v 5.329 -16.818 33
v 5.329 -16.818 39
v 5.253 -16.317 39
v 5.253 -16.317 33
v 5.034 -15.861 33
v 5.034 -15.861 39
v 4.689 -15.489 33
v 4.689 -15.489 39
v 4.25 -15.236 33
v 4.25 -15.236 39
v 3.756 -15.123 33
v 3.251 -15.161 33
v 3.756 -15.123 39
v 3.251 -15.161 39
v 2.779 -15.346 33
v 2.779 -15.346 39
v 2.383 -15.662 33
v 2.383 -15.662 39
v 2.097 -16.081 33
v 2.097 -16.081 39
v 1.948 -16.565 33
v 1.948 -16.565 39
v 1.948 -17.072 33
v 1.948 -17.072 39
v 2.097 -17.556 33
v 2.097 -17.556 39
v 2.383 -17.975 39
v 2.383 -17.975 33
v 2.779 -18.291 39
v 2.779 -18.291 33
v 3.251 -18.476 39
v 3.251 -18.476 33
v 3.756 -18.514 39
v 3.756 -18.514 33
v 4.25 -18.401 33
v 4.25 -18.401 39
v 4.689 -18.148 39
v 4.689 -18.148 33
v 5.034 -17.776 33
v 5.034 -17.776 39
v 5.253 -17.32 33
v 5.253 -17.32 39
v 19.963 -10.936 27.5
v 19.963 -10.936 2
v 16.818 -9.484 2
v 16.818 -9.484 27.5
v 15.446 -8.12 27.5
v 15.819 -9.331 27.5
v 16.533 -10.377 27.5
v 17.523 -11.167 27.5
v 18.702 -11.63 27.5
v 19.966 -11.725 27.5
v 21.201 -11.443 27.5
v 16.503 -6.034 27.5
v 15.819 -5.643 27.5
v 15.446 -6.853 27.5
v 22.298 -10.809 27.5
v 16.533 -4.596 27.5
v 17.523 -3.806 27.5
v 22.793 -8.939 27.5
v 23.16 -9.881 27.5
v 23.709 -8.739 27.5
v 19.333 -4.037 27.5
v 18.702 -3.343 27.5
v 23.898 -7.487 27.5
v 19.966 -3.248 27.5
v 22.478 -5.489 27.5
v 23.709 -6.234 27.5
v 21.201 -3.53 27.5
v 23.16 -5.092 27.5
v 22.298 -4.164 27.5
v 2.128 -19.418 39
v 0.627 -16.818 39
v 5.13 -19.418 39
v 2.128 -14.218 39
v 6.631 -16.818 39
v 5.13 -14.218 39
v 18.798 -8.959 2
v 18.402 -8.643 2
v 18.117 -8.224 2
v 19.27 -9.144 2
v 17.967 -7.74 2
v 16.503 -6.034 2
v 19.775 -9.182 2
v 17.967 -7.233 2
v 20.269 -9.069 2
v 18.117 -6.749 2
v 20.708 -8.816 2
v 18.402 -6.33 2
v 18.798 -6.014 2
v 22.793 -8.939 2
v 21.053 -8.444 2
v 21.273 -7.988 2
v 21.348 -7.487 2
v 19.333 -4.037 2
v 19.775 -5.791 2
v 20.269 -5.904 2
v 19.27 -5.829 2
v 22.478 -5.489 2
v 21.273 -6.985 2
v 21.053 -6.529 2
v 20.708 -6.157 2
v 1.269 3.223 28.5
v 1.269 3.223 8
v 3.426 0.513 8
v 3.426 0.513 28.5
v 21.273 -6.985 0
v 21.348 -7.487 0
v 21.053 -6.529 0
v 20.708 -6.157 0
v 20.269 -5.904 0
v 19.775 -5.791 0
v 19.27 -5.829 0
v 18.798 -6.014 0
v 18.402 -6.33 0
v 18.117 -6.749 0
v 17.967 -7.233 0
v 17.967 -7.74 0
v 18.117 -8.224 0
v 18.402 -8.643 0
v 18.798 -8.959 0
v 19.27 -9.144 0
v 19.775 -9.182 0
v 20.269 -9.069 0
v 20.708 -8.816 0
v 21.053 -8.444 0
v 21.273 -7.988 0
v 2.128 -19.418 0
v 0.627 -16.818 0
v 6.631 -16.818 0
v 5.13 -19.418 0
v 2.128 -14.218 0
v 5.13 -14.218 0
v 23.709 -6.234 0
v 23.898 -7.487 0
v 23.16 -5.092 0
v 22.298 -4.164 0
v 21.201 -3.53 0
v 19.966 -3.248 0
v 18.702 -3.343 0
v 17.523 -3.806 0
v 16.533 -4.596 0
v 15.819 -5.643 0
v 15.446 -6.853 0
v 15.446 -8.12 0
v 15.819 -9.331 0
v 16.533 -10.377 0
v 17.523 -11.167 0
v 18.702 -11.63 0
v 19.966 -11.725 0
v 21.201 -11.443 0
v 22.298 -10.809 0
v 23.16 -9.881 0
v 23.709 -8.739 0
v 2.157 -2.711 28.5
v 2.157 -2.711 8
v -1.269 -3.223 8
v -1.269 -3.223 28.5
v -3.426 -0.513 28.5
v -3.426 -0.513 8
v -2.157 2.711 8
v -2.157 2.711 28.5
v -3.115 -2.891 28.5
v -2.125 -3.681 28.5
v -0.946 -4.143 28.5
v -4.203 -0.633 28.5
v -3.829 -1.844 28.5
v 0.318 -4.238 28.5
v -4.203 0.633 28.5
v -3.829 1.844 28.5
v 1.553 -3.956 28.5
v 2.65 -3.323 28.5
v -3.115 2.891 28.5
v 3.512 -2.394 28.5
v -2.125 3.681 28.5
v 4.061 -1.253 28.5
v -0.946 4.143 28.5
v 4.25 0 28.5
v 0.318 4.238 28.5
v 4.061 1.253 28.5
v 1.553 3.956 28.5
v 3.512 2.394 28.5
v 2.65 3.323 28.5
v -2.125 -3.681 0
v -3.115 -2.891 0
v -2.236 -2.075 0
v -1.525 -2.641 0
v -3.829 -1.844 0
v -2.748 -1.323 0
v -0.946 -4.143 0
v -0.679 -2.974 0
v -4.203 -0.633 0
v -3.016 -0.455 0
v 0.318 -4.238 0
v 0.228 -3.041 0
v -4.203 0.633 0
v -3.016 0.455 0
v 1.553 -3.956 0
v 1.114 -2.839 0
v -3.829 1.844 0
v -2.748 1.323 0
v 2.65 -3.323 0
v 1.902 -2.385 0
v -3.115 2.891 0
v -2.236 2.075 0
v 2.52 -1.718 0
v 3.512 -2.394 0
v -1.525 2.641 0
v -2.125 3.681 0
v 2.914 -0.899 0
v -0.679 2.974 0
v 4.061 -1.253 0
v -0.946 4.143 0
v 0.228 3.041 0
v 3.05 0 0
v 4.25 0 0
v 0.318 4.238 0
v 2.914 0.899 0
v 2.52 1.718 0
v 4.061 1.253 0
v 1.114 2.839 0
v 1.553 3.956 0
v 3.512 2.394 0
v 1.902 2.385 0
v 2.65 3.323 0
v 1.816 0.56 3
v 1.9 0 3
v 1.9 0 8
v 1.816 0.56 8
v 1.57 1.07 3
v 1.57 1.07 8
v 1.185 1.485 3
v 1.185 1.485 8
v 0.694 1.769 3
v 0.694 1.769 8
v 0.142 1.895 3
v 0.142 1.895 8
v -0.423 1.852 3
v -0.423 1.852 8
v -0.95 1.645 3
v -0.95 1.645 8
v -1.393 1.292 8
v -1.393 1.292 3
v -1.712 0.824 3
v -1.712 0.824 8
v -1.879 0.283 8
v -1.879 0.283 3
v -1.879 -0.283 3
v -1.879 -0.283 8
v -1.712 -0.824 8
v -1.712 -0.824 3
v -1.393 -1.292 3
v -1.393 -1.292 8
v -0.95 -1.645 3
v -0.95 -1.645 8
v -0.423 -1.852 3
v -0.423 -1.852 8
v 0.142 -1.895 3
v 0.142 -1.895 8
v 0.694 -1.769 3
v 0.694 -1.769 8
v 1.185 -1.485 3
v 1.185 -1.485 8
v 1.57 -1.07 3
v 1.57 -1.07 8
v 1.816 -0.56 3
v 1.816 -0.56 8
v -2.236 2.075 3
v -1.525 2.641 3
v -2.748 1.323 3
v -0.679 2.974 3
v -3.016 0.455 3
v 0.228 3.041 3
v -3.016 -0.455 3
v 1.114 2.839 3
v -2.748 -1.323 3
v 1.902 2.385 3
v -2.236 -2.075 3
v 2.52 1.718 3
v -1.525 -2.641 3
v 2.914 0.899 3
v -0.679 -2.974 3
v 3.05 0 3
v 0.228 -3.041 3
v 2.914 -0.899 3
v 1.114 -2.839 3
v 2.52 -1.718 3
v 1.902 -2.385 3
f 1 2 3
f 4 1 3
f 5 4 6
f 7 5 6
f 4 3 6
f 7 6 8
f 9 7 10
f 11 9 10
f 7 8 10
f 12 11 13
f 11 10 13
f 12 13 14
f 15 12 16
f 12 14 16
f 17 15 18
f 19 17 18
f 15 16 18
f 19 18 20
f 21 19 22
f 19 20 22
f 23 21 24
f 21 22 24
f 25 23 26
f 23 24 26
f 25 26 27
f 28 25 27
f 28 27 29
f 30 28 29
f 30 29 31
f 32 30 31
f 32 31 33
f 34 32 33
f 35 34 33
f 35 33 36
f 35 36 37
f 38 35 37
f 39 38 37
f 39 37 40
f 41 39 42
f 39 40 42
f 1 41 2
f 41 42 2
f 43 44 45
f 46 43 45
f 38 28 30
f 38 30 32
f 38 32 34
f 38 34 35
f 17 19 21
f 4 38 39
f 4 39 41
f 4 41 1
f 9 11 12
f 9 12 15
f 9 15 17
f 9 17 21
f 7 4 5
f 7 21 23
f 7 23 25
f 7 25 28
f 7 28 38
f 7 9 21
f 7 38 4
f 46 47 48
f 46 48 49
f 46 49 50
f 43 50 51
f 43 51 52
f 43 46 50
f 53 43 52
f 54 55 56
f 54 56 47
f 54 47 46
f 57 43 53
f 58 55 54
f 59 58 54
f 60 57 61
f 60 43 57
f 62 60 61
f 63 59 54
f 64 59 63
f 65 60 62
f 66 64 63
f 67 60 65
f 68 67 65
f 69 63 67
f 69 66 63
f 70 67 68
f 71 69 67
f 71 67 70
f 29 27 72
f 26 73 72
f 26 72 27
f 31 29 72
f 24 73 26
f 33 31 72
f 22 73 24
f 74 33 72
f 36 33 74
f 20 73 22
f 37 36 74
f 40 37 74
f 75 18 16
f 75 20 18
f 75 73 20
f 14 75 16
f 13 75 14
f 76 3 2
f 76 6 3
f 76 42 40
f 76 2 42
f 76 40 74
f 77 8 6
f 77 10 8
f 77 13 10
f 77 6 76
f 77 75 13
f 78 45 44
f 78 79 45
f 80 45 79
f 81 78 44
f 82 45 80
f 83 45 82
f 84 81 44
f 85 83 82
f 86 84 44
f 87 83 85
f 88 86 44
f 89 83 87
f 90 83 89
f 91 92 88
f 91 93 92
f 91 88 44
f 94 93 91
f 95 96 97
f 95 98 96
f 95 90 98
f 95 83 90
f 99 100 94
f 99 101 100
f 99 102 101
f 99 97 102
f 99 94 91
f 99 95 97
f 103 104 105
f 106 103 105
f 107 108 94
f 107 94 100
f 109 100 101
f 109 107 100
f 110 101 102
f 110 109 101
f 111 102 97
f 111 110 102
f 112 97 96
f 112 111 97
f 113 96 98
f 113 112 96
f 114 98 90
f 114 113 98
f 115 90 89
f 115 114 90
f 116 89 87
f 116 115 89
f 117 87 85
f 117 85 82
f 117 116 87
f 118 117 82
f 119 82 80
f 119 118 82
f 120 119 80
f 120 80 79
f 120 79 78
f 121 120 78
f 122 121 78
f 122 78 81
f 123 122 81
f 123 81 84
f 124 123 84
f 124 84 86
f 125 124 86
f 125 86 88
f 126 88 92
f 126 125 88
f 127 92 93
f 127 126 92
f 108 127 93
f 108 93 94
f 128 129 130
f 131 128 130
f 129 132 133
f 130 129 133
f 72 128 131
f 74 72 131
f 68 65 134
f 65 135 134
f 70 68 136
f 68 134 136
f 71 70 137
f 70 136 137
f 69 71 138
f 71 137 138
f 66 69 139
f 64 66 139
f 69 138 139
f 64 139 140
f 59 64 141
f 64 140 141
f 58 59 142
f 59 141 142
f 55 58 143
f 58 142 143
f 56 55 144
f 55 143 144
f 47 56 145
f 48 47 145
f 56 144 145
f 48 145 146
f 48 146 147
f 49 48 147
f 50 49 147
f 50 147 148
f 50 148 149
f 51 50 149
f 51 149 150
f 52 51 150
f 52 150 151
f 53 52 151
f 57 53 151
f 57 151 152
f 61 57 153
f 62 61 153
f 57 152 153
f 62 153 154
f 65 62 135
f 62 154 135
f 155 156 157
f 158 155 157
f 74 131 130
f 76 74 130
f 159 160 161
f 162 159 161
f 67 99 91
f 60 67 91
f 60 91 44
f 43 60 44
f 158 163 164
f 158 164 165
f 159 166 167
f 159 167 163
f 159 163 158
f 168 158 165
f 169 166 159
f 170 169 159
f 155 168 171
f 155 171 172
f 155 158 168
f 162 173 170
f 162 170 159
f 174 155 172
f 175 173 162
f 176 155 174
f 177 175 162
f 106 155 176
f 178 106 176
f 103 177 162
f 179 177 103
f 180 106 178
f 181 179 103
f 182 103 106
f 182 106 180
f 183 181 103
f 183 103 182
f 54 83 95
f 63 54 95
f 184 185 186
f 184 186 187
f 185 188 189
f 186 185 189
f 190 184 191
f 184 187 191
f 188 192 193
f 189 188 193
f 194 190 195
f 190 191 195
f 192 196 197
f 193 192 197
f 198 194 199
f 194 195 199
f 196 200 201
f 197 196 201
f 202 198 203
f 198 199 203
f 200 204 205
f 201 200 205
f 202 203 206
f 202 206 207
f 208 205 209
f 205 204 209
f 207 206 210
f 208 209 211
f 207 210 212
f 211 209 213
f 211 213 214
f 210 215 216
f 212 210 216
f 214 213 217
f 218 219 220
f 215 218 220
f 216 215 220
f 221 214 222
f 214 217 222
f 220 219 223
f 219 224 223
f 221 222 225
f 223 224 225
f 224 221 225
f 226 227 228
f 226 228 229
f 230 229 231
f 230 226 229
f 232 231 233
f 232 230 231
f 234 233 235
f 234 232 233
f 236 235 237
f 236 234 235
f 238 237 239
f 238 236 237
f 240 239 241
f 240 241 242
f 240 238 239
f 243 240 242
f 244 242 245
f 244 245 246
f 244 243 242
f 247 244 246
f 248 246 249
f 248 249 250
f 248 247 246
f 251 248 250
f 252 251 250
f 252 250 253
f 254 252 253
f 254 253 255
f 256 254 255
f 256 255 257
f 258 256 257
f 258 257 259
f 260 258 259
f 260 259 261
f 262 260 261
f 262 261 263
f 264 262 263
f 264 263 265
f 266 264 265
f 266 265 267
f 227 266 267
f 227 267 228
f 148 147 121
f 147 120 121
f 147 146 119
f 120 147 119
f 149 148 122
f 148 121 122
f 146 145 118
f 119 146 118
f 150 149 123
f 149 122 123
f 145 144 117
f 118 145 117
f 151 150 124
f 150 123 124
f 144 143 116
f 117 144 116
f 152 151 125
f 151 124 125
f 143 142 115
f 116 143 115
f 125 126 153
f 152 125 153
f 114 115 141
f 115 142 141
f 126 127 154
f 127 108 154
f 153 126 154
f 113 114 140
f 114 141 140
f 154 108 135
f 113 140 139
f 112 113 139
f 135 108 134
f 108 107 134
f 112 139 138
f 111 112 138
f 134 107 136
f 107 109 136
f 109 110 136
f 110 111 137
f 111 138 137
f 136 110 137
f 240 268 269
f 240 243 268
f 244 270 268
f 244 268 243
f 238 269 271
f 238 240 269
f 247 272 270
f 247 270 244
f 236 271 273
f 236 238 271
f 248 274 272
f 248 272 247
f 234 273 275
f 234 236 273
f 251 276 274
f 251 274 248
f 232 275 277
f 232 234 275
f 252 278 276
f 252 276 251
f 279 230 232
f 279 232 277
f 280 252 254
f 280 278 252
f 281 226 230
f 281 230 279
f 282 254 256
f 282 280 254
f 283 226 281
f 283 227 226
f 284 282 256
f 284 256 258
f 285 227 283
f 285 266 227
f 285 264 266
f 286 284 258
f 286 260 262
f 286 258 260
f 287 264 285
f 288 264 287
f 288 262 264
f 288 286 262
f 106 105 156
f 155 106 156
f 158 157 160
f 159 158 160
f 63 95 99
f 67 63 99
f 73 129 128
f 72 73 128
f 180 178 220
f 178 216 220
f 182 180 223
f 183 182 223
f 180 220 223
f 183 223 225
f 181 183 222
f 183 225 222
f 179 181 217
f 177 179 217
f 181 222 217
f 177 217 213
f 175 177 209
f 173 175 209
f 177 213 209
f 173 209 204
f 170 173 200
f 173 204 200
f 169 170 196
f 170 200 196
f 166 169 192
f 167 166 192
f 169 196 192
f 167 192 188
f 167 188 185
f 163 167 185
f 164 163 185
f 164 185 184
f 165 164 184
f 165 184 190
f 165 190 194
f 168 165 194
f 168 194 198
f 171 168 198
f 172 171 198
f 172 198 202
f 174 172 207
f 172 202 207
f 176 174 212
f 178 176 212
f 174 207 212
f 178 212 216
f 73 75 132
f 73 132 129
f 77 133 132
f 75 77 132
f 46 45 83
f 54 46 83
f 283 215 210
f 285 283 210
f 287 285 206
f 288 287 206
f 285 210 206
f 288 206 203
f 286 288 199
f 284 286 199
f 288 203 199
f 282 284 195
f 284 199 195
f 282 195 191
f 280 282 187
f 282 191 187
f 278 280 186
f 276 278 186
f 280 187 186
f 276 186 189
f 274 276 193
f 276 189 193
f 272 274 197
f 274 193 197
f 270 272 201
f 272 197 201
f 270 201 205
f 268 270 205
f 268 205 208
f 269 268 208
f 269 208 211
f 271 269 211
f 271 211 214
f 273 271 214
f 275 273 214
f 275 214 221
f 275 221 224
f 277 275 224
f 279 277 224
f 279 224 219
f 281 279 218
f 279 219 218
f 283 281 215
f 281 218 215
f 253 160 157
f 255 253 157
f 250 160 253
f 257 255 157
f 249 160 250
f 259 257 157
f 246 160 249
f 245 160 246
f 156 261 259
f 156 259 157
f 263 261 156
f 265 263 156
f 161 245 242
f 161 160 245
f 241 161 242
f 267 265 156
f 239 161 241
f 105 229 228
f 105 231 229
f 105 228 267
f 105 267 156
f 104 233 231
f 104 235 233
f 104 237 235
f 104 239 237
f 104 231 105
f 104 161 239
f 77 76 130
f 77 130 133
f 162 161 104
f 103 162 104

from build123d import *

# Parameters (mm, degrees)
F0_R      = 4.25
F0_R_2    = 1.9
F1_DEPTH  = 8
F2_R      = 3.05
F3_DEPTH  = 3
F4_R      = 4.25
F5_DEPTH  = 20.5
F6_R      = 4.25
F6_R_2    = 1.7
F7_DEPTH  = 2
F8_R      = 4.25
F9_DEPTH  = 25.5
F11_DEPTH = 39
F12_R     = 1.7
F13_DEPTH = 6


with BuildPart() as f1:
    # F0 (on Top) → F1 (new body)
    with BuildSketch(Plane.XY):
        Circle(F0_R)
        Circle(F0_R_2, mode=Mode.SUBTRACT)
    extrude(amount=F1_DEPTH)

    # F2 (on face) → F3 (cut)
    with BuildSketch(Plane(origin=(0, 0, 0), x_dir=(1, 0, 0), z_dir=(0, 0, -1))):
        Circle(F2_R)
    extrude(amount=-F3_DEPTH, mode=Mode.SUBTRACT)

    # F4 (on face) → F5 (join)
    with BuildSketch(Plane.XY.offset(8)):
        Circle(F4_R)
        Polygon((-2.157109, 2.710513), (1.268819, 3.223368), (3.425928, 0.512854), (2.157109, -2.710513), (-1.268819, -3.223368), (-3.425928, -0.512854), align=None, mode=Mode.SUBTRACT)
    extrude(amount=F5_DEPTH)


with BuildPart() as f7:
    # F6 (on Top) → F7 (new body)
    with BuildSketch(Plane.XY):
        with Locations((19.648151, -7.486545)):
            Circle(F6_R)
        with Locations((19.648151, -7.486545)):
            Circle(F6_R_2, mode=Mode.SUBTRACT)
    extrude(amount=F7_DEPTH)

    # F8 (on face) → F9 (join)
    with BuildSketch(Plane.XY.offset(2)):
        with Locations((19.648151, -7.486545)):
            Circle(F8_R)
        Polygon((16.503104, -6.034418), (19.333207, -4.03679), (22.478255, -5.488918), (22.793199, -8.938673), (19.963096, -10.936301), (16.818048, -9.484173), align=None, mode=Mode.SUBTRACT)
    extrude(amount=F9_DEPTH)


with BuildPart() as f11:
    # F10 (on Top) → F11 (new body)
    with BuildSketch(Plane.XY):
        Polygon((5.130074, -14.218488), (2.127852, -14.218488), (0.626742, -16.818488), (2.127852, -19.418488), (5.130074, -19.418488), (6.631184, -16.818488), align=None)
    extrude(amount=F11_DEPTH)

    # F12 (on face) → F13 (cut)
    with BuildSketch(Plane.XY.offset(39)):
        with Locations((3.628963, -16.818488)):
            Circle(F12_R)
    extrude(amount=-F13_DEPTH, mode=Mode.SUBTRACT)


solid = Compound([f1.part, f7.part, f11.part])
